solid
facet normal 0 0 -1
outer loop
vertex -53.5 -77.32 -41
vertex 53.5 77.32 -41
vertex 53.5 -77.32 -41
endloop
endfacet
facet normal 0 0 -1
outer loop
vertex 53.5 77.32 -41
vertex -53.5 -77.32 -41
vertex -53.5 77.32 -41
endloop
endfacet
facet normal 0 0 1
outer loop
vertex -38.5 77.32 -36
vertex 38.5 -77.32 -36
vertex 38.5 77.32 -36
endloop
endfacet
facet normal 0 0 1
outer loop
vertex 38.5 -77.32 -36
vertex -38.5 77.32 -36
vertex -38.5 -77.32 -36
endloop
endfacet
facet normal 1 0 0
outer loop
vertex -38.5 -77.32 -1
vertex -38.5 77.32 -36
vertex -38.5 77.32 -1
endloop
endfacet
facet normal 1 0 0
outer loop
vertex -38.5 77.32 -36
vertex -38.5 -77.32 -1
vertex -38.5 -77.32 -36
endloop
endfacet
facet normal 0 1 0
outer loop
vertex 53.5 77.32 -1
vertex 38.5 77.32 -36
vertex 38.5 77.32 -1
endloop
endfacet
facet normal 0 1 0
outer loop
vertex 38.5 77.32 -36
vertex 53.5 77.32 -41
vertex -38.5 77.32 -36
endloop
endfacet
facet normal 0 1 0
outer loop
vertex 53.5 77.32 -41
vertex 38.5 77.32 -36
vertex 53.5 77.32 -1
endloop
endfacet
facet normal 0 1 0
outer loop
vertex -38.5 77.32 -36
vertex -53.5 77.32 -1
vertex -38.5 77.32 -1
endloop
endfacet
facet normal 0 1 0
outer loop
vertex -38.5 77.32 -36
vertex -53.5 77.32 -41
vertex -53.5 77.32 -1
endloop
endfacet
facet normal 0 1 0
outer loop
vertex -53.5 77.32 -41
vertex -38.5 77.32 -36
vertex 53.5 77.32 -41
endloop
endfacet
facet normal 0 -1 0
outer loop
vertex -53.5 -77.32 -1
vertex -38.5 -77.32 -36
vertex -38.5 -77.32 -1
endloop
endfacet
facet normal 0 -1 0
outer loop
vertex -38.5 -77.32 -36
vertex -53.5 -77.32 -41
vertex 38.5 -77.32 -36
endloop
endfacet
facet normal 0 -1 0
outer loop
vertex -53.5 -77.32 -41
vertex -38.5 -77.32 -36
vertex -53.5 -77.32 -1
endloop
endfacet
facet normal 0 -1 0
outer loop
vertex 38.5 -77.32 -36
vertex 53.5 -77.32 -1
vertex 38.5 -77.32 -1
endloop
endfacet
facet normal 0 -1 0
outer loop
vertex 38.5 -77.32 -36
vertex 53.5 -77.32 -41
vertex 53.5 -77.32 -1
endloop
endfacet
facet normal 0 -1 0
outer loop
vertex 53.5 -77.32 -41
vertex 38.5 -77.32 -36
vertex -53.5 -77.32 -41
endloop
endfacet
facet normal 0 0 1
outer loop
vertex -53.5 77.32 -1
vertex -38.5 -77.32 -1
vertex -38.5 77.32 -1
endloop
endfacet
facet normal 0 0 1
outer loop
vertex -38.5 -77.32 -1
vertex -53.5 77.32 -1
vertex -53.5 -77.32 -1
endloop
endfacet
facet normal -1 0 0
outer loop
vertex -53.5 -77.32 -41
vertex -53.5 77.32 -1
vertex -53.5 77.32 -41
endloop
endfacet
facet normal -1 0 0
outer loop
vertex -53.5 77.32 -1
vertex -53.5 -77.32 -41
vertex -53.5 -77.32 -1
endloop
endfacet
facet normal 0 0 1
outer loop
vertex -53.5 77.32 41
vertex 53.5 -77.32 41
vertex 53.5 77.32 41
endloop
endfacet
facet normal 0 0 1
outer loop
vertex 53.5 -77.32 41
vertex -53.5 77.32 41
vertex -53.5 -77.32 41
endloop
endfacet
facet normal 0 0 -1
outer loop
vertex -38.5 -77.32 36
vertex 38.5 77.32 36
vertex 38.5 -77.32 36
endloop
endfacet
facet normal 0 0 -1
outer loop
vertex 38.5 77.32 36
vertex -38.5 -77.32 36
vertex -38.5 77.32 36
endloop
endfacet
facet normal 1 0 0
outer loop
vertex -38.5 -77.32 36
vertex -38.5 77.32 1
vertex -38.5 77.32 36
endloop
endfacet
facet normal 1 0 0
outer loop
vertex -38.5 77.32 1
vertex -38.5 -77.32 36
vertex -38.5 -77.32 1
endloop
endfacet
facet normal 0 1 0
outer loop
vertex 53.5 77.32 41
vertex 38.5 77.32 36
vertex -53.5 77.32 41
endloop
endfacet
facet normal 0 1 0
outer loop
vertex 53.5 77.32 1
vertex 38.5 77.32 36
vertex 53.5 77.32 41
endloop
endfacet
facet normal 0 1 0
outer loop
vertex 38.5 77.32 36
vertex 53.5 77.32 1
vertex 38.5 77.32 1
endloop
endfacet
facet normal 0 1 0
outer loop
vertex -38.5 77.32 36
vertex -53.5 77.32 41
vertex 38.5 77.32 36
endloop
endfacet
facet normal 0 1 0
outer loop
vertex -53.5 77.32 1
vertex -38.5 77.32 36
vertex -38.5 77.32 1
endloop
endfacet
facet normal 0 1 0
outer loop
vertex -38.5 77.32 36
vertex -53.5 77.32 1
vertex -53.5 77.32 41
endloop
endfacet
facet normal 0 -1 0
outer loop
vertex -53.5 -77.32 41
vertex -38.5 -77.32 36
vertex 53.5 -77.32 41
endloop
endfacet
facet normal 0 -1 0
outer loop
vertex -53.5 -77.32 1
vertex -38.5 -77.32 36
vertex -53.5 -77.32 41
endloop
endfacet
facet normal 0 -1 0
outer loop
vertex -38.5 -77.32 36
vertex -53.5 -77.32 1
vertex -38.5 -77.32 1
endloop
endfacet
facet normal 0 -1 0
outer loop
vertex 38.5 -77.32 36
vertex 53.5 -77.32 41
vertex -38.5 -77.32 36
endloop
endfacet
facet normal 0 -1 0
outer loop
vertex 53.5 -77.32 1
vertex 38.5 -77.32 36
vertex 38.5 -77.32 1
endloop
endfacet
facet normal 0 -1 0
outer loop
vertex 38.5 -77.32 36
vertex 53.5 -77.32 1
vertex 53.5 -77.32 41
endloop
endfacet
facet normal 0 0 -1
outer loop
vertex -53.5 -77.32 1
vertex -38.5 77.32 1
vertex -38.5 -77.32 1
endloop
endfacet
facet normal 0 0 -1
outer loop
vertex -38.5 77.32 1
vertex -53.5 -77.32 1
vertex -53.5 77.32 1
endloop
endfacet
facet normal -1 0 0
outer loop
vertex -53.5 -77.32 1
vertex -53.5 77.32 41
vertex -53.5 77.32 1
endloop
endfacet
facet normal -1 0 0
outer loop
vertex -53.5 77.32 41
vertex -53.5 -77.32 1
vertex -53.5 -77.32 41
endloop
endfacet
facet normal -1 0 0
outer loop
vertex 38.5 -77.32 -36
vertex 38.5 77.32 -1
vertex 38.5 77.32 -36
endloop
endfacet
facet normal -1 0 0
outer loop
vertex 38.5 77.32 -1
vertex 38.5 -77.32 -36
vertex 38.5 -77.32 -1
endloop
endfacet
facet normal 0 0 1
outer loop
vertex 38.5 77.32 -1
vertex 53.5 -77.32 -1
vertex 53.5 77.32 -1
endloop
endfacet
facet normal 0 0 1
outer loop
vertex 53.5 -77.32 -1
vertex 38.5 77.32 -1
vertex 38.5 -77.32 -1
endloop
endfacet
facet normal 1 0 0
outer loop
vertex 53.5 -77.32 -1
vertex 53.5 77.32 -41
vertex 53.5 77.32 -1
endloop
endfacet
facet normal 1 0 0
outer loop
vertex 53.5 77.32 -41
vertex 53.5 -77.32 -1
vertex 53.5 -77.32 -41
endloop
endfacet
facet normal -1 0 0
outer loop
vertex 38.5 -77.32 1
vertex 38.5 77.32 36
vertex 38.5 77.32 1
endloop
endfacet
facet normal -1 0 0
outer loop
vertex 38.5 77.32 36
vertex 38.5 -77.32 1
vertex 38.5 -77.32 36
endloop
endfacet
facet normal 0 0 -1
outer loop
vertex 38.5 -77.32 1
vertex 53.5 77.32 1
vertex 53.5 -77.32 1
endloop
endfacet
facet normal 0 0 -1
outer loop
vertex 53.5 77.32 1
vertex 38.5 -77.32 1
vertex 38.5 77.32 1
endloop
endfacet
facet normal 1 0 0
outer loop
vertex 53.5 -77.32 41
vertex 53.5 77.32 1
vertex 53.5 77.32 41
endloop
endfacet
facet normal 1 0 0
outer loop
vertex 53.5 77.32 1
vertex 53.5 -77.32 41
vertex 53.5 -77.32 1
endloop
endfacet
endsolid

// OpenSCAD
// file: mirror_copy.scad
module mirror_copy(vector=[1,0,0]){
    children();
    mirror(vector) children();
}
// main file
use<mirror_copy.scad>

//creates blind and through dovetails

//***************** variables *******************
shrinkage = 100 / 97;
lp = 12;     // length of pin
lb = 40;
tt = 15;     // thickness of tail
tp = 5;     // thickness of pin
n = 3;      // number of pins
clearance = 0;

//************* calulated variables **************
wp = 20 * shrinkage;   // width of pin
wt = 30 * shrinkage;   // width of tail
wb = 150 * shrinkage;   // board width
taper = lp / 7;
pitch = wt + wp - taper;
board_length = lb + 2 * (tt - lp);
board_width = wb;

//*************** example objects ****************
//creates a square carcase
mirror_copy([1,0,0]) mirror_copy([0,0,1])
translate([-board_length-tt/2, 0, tp-board_length]){
    board(board_length, board_width, tp, tt, lp, true);
    board(lb, wb, tp, tt, lp, false);
}

//***************** modules *******************
module board(lb, w, tp, tt, lp, pin) {
    if (pin) {
        t = tp;     // set board thickness to pin thickness (for blind dovetails)
        board_length = lb - 2 * (tt - lp);
        translate([tt, -w/2, 0])
            color("Red") cube([board_length, w, t]);     // board
        translate([tt - lp, 0, 0])
            color("lightGray") pin(lp, wp, tp, clearance);     // center pin
        for (i = [0 : (n - 1) / 2])
            translate([tt - lp, 0, 0])
                mirror_copy([0, 1, 0]) translate([0, i * pitch, 0])
                    color("lightGray") pin(lp, wp, tp, clearance);     // outer pins
    } else {
        t = tt;     // set board thickness to tail thickness (for blind dovetails)
        translate([0, -w/2, 0])
            color("Blue") cube([tt, w, lb]);     // board
        translate([tt - lp, 0, 0])
            pin(lp, wp, tp, clearance);     // center pin
        for (i = [0 : (n - 1) / 2])
            mirror_copy([0, 1, 0]) translate([tt - lp, i * pitch, 0])
                color("lightGray") pin(lp, wp, tp, clearance);     // outer pin sockets
    }
}

module pin(l, w, t, clearance) {
    translate([0, 0, t/2]) {     // move to Z0
        path = [
            [0, 0],
            [0, (w - clearance)/2],
            [l, w/2 - taper],
            [l, taper - w/2],
            [0, (clearance - w)/2]
        ];
        translate([0, 0, -t/2])
            linear_extrude(t) polygon(path);
    }
}
